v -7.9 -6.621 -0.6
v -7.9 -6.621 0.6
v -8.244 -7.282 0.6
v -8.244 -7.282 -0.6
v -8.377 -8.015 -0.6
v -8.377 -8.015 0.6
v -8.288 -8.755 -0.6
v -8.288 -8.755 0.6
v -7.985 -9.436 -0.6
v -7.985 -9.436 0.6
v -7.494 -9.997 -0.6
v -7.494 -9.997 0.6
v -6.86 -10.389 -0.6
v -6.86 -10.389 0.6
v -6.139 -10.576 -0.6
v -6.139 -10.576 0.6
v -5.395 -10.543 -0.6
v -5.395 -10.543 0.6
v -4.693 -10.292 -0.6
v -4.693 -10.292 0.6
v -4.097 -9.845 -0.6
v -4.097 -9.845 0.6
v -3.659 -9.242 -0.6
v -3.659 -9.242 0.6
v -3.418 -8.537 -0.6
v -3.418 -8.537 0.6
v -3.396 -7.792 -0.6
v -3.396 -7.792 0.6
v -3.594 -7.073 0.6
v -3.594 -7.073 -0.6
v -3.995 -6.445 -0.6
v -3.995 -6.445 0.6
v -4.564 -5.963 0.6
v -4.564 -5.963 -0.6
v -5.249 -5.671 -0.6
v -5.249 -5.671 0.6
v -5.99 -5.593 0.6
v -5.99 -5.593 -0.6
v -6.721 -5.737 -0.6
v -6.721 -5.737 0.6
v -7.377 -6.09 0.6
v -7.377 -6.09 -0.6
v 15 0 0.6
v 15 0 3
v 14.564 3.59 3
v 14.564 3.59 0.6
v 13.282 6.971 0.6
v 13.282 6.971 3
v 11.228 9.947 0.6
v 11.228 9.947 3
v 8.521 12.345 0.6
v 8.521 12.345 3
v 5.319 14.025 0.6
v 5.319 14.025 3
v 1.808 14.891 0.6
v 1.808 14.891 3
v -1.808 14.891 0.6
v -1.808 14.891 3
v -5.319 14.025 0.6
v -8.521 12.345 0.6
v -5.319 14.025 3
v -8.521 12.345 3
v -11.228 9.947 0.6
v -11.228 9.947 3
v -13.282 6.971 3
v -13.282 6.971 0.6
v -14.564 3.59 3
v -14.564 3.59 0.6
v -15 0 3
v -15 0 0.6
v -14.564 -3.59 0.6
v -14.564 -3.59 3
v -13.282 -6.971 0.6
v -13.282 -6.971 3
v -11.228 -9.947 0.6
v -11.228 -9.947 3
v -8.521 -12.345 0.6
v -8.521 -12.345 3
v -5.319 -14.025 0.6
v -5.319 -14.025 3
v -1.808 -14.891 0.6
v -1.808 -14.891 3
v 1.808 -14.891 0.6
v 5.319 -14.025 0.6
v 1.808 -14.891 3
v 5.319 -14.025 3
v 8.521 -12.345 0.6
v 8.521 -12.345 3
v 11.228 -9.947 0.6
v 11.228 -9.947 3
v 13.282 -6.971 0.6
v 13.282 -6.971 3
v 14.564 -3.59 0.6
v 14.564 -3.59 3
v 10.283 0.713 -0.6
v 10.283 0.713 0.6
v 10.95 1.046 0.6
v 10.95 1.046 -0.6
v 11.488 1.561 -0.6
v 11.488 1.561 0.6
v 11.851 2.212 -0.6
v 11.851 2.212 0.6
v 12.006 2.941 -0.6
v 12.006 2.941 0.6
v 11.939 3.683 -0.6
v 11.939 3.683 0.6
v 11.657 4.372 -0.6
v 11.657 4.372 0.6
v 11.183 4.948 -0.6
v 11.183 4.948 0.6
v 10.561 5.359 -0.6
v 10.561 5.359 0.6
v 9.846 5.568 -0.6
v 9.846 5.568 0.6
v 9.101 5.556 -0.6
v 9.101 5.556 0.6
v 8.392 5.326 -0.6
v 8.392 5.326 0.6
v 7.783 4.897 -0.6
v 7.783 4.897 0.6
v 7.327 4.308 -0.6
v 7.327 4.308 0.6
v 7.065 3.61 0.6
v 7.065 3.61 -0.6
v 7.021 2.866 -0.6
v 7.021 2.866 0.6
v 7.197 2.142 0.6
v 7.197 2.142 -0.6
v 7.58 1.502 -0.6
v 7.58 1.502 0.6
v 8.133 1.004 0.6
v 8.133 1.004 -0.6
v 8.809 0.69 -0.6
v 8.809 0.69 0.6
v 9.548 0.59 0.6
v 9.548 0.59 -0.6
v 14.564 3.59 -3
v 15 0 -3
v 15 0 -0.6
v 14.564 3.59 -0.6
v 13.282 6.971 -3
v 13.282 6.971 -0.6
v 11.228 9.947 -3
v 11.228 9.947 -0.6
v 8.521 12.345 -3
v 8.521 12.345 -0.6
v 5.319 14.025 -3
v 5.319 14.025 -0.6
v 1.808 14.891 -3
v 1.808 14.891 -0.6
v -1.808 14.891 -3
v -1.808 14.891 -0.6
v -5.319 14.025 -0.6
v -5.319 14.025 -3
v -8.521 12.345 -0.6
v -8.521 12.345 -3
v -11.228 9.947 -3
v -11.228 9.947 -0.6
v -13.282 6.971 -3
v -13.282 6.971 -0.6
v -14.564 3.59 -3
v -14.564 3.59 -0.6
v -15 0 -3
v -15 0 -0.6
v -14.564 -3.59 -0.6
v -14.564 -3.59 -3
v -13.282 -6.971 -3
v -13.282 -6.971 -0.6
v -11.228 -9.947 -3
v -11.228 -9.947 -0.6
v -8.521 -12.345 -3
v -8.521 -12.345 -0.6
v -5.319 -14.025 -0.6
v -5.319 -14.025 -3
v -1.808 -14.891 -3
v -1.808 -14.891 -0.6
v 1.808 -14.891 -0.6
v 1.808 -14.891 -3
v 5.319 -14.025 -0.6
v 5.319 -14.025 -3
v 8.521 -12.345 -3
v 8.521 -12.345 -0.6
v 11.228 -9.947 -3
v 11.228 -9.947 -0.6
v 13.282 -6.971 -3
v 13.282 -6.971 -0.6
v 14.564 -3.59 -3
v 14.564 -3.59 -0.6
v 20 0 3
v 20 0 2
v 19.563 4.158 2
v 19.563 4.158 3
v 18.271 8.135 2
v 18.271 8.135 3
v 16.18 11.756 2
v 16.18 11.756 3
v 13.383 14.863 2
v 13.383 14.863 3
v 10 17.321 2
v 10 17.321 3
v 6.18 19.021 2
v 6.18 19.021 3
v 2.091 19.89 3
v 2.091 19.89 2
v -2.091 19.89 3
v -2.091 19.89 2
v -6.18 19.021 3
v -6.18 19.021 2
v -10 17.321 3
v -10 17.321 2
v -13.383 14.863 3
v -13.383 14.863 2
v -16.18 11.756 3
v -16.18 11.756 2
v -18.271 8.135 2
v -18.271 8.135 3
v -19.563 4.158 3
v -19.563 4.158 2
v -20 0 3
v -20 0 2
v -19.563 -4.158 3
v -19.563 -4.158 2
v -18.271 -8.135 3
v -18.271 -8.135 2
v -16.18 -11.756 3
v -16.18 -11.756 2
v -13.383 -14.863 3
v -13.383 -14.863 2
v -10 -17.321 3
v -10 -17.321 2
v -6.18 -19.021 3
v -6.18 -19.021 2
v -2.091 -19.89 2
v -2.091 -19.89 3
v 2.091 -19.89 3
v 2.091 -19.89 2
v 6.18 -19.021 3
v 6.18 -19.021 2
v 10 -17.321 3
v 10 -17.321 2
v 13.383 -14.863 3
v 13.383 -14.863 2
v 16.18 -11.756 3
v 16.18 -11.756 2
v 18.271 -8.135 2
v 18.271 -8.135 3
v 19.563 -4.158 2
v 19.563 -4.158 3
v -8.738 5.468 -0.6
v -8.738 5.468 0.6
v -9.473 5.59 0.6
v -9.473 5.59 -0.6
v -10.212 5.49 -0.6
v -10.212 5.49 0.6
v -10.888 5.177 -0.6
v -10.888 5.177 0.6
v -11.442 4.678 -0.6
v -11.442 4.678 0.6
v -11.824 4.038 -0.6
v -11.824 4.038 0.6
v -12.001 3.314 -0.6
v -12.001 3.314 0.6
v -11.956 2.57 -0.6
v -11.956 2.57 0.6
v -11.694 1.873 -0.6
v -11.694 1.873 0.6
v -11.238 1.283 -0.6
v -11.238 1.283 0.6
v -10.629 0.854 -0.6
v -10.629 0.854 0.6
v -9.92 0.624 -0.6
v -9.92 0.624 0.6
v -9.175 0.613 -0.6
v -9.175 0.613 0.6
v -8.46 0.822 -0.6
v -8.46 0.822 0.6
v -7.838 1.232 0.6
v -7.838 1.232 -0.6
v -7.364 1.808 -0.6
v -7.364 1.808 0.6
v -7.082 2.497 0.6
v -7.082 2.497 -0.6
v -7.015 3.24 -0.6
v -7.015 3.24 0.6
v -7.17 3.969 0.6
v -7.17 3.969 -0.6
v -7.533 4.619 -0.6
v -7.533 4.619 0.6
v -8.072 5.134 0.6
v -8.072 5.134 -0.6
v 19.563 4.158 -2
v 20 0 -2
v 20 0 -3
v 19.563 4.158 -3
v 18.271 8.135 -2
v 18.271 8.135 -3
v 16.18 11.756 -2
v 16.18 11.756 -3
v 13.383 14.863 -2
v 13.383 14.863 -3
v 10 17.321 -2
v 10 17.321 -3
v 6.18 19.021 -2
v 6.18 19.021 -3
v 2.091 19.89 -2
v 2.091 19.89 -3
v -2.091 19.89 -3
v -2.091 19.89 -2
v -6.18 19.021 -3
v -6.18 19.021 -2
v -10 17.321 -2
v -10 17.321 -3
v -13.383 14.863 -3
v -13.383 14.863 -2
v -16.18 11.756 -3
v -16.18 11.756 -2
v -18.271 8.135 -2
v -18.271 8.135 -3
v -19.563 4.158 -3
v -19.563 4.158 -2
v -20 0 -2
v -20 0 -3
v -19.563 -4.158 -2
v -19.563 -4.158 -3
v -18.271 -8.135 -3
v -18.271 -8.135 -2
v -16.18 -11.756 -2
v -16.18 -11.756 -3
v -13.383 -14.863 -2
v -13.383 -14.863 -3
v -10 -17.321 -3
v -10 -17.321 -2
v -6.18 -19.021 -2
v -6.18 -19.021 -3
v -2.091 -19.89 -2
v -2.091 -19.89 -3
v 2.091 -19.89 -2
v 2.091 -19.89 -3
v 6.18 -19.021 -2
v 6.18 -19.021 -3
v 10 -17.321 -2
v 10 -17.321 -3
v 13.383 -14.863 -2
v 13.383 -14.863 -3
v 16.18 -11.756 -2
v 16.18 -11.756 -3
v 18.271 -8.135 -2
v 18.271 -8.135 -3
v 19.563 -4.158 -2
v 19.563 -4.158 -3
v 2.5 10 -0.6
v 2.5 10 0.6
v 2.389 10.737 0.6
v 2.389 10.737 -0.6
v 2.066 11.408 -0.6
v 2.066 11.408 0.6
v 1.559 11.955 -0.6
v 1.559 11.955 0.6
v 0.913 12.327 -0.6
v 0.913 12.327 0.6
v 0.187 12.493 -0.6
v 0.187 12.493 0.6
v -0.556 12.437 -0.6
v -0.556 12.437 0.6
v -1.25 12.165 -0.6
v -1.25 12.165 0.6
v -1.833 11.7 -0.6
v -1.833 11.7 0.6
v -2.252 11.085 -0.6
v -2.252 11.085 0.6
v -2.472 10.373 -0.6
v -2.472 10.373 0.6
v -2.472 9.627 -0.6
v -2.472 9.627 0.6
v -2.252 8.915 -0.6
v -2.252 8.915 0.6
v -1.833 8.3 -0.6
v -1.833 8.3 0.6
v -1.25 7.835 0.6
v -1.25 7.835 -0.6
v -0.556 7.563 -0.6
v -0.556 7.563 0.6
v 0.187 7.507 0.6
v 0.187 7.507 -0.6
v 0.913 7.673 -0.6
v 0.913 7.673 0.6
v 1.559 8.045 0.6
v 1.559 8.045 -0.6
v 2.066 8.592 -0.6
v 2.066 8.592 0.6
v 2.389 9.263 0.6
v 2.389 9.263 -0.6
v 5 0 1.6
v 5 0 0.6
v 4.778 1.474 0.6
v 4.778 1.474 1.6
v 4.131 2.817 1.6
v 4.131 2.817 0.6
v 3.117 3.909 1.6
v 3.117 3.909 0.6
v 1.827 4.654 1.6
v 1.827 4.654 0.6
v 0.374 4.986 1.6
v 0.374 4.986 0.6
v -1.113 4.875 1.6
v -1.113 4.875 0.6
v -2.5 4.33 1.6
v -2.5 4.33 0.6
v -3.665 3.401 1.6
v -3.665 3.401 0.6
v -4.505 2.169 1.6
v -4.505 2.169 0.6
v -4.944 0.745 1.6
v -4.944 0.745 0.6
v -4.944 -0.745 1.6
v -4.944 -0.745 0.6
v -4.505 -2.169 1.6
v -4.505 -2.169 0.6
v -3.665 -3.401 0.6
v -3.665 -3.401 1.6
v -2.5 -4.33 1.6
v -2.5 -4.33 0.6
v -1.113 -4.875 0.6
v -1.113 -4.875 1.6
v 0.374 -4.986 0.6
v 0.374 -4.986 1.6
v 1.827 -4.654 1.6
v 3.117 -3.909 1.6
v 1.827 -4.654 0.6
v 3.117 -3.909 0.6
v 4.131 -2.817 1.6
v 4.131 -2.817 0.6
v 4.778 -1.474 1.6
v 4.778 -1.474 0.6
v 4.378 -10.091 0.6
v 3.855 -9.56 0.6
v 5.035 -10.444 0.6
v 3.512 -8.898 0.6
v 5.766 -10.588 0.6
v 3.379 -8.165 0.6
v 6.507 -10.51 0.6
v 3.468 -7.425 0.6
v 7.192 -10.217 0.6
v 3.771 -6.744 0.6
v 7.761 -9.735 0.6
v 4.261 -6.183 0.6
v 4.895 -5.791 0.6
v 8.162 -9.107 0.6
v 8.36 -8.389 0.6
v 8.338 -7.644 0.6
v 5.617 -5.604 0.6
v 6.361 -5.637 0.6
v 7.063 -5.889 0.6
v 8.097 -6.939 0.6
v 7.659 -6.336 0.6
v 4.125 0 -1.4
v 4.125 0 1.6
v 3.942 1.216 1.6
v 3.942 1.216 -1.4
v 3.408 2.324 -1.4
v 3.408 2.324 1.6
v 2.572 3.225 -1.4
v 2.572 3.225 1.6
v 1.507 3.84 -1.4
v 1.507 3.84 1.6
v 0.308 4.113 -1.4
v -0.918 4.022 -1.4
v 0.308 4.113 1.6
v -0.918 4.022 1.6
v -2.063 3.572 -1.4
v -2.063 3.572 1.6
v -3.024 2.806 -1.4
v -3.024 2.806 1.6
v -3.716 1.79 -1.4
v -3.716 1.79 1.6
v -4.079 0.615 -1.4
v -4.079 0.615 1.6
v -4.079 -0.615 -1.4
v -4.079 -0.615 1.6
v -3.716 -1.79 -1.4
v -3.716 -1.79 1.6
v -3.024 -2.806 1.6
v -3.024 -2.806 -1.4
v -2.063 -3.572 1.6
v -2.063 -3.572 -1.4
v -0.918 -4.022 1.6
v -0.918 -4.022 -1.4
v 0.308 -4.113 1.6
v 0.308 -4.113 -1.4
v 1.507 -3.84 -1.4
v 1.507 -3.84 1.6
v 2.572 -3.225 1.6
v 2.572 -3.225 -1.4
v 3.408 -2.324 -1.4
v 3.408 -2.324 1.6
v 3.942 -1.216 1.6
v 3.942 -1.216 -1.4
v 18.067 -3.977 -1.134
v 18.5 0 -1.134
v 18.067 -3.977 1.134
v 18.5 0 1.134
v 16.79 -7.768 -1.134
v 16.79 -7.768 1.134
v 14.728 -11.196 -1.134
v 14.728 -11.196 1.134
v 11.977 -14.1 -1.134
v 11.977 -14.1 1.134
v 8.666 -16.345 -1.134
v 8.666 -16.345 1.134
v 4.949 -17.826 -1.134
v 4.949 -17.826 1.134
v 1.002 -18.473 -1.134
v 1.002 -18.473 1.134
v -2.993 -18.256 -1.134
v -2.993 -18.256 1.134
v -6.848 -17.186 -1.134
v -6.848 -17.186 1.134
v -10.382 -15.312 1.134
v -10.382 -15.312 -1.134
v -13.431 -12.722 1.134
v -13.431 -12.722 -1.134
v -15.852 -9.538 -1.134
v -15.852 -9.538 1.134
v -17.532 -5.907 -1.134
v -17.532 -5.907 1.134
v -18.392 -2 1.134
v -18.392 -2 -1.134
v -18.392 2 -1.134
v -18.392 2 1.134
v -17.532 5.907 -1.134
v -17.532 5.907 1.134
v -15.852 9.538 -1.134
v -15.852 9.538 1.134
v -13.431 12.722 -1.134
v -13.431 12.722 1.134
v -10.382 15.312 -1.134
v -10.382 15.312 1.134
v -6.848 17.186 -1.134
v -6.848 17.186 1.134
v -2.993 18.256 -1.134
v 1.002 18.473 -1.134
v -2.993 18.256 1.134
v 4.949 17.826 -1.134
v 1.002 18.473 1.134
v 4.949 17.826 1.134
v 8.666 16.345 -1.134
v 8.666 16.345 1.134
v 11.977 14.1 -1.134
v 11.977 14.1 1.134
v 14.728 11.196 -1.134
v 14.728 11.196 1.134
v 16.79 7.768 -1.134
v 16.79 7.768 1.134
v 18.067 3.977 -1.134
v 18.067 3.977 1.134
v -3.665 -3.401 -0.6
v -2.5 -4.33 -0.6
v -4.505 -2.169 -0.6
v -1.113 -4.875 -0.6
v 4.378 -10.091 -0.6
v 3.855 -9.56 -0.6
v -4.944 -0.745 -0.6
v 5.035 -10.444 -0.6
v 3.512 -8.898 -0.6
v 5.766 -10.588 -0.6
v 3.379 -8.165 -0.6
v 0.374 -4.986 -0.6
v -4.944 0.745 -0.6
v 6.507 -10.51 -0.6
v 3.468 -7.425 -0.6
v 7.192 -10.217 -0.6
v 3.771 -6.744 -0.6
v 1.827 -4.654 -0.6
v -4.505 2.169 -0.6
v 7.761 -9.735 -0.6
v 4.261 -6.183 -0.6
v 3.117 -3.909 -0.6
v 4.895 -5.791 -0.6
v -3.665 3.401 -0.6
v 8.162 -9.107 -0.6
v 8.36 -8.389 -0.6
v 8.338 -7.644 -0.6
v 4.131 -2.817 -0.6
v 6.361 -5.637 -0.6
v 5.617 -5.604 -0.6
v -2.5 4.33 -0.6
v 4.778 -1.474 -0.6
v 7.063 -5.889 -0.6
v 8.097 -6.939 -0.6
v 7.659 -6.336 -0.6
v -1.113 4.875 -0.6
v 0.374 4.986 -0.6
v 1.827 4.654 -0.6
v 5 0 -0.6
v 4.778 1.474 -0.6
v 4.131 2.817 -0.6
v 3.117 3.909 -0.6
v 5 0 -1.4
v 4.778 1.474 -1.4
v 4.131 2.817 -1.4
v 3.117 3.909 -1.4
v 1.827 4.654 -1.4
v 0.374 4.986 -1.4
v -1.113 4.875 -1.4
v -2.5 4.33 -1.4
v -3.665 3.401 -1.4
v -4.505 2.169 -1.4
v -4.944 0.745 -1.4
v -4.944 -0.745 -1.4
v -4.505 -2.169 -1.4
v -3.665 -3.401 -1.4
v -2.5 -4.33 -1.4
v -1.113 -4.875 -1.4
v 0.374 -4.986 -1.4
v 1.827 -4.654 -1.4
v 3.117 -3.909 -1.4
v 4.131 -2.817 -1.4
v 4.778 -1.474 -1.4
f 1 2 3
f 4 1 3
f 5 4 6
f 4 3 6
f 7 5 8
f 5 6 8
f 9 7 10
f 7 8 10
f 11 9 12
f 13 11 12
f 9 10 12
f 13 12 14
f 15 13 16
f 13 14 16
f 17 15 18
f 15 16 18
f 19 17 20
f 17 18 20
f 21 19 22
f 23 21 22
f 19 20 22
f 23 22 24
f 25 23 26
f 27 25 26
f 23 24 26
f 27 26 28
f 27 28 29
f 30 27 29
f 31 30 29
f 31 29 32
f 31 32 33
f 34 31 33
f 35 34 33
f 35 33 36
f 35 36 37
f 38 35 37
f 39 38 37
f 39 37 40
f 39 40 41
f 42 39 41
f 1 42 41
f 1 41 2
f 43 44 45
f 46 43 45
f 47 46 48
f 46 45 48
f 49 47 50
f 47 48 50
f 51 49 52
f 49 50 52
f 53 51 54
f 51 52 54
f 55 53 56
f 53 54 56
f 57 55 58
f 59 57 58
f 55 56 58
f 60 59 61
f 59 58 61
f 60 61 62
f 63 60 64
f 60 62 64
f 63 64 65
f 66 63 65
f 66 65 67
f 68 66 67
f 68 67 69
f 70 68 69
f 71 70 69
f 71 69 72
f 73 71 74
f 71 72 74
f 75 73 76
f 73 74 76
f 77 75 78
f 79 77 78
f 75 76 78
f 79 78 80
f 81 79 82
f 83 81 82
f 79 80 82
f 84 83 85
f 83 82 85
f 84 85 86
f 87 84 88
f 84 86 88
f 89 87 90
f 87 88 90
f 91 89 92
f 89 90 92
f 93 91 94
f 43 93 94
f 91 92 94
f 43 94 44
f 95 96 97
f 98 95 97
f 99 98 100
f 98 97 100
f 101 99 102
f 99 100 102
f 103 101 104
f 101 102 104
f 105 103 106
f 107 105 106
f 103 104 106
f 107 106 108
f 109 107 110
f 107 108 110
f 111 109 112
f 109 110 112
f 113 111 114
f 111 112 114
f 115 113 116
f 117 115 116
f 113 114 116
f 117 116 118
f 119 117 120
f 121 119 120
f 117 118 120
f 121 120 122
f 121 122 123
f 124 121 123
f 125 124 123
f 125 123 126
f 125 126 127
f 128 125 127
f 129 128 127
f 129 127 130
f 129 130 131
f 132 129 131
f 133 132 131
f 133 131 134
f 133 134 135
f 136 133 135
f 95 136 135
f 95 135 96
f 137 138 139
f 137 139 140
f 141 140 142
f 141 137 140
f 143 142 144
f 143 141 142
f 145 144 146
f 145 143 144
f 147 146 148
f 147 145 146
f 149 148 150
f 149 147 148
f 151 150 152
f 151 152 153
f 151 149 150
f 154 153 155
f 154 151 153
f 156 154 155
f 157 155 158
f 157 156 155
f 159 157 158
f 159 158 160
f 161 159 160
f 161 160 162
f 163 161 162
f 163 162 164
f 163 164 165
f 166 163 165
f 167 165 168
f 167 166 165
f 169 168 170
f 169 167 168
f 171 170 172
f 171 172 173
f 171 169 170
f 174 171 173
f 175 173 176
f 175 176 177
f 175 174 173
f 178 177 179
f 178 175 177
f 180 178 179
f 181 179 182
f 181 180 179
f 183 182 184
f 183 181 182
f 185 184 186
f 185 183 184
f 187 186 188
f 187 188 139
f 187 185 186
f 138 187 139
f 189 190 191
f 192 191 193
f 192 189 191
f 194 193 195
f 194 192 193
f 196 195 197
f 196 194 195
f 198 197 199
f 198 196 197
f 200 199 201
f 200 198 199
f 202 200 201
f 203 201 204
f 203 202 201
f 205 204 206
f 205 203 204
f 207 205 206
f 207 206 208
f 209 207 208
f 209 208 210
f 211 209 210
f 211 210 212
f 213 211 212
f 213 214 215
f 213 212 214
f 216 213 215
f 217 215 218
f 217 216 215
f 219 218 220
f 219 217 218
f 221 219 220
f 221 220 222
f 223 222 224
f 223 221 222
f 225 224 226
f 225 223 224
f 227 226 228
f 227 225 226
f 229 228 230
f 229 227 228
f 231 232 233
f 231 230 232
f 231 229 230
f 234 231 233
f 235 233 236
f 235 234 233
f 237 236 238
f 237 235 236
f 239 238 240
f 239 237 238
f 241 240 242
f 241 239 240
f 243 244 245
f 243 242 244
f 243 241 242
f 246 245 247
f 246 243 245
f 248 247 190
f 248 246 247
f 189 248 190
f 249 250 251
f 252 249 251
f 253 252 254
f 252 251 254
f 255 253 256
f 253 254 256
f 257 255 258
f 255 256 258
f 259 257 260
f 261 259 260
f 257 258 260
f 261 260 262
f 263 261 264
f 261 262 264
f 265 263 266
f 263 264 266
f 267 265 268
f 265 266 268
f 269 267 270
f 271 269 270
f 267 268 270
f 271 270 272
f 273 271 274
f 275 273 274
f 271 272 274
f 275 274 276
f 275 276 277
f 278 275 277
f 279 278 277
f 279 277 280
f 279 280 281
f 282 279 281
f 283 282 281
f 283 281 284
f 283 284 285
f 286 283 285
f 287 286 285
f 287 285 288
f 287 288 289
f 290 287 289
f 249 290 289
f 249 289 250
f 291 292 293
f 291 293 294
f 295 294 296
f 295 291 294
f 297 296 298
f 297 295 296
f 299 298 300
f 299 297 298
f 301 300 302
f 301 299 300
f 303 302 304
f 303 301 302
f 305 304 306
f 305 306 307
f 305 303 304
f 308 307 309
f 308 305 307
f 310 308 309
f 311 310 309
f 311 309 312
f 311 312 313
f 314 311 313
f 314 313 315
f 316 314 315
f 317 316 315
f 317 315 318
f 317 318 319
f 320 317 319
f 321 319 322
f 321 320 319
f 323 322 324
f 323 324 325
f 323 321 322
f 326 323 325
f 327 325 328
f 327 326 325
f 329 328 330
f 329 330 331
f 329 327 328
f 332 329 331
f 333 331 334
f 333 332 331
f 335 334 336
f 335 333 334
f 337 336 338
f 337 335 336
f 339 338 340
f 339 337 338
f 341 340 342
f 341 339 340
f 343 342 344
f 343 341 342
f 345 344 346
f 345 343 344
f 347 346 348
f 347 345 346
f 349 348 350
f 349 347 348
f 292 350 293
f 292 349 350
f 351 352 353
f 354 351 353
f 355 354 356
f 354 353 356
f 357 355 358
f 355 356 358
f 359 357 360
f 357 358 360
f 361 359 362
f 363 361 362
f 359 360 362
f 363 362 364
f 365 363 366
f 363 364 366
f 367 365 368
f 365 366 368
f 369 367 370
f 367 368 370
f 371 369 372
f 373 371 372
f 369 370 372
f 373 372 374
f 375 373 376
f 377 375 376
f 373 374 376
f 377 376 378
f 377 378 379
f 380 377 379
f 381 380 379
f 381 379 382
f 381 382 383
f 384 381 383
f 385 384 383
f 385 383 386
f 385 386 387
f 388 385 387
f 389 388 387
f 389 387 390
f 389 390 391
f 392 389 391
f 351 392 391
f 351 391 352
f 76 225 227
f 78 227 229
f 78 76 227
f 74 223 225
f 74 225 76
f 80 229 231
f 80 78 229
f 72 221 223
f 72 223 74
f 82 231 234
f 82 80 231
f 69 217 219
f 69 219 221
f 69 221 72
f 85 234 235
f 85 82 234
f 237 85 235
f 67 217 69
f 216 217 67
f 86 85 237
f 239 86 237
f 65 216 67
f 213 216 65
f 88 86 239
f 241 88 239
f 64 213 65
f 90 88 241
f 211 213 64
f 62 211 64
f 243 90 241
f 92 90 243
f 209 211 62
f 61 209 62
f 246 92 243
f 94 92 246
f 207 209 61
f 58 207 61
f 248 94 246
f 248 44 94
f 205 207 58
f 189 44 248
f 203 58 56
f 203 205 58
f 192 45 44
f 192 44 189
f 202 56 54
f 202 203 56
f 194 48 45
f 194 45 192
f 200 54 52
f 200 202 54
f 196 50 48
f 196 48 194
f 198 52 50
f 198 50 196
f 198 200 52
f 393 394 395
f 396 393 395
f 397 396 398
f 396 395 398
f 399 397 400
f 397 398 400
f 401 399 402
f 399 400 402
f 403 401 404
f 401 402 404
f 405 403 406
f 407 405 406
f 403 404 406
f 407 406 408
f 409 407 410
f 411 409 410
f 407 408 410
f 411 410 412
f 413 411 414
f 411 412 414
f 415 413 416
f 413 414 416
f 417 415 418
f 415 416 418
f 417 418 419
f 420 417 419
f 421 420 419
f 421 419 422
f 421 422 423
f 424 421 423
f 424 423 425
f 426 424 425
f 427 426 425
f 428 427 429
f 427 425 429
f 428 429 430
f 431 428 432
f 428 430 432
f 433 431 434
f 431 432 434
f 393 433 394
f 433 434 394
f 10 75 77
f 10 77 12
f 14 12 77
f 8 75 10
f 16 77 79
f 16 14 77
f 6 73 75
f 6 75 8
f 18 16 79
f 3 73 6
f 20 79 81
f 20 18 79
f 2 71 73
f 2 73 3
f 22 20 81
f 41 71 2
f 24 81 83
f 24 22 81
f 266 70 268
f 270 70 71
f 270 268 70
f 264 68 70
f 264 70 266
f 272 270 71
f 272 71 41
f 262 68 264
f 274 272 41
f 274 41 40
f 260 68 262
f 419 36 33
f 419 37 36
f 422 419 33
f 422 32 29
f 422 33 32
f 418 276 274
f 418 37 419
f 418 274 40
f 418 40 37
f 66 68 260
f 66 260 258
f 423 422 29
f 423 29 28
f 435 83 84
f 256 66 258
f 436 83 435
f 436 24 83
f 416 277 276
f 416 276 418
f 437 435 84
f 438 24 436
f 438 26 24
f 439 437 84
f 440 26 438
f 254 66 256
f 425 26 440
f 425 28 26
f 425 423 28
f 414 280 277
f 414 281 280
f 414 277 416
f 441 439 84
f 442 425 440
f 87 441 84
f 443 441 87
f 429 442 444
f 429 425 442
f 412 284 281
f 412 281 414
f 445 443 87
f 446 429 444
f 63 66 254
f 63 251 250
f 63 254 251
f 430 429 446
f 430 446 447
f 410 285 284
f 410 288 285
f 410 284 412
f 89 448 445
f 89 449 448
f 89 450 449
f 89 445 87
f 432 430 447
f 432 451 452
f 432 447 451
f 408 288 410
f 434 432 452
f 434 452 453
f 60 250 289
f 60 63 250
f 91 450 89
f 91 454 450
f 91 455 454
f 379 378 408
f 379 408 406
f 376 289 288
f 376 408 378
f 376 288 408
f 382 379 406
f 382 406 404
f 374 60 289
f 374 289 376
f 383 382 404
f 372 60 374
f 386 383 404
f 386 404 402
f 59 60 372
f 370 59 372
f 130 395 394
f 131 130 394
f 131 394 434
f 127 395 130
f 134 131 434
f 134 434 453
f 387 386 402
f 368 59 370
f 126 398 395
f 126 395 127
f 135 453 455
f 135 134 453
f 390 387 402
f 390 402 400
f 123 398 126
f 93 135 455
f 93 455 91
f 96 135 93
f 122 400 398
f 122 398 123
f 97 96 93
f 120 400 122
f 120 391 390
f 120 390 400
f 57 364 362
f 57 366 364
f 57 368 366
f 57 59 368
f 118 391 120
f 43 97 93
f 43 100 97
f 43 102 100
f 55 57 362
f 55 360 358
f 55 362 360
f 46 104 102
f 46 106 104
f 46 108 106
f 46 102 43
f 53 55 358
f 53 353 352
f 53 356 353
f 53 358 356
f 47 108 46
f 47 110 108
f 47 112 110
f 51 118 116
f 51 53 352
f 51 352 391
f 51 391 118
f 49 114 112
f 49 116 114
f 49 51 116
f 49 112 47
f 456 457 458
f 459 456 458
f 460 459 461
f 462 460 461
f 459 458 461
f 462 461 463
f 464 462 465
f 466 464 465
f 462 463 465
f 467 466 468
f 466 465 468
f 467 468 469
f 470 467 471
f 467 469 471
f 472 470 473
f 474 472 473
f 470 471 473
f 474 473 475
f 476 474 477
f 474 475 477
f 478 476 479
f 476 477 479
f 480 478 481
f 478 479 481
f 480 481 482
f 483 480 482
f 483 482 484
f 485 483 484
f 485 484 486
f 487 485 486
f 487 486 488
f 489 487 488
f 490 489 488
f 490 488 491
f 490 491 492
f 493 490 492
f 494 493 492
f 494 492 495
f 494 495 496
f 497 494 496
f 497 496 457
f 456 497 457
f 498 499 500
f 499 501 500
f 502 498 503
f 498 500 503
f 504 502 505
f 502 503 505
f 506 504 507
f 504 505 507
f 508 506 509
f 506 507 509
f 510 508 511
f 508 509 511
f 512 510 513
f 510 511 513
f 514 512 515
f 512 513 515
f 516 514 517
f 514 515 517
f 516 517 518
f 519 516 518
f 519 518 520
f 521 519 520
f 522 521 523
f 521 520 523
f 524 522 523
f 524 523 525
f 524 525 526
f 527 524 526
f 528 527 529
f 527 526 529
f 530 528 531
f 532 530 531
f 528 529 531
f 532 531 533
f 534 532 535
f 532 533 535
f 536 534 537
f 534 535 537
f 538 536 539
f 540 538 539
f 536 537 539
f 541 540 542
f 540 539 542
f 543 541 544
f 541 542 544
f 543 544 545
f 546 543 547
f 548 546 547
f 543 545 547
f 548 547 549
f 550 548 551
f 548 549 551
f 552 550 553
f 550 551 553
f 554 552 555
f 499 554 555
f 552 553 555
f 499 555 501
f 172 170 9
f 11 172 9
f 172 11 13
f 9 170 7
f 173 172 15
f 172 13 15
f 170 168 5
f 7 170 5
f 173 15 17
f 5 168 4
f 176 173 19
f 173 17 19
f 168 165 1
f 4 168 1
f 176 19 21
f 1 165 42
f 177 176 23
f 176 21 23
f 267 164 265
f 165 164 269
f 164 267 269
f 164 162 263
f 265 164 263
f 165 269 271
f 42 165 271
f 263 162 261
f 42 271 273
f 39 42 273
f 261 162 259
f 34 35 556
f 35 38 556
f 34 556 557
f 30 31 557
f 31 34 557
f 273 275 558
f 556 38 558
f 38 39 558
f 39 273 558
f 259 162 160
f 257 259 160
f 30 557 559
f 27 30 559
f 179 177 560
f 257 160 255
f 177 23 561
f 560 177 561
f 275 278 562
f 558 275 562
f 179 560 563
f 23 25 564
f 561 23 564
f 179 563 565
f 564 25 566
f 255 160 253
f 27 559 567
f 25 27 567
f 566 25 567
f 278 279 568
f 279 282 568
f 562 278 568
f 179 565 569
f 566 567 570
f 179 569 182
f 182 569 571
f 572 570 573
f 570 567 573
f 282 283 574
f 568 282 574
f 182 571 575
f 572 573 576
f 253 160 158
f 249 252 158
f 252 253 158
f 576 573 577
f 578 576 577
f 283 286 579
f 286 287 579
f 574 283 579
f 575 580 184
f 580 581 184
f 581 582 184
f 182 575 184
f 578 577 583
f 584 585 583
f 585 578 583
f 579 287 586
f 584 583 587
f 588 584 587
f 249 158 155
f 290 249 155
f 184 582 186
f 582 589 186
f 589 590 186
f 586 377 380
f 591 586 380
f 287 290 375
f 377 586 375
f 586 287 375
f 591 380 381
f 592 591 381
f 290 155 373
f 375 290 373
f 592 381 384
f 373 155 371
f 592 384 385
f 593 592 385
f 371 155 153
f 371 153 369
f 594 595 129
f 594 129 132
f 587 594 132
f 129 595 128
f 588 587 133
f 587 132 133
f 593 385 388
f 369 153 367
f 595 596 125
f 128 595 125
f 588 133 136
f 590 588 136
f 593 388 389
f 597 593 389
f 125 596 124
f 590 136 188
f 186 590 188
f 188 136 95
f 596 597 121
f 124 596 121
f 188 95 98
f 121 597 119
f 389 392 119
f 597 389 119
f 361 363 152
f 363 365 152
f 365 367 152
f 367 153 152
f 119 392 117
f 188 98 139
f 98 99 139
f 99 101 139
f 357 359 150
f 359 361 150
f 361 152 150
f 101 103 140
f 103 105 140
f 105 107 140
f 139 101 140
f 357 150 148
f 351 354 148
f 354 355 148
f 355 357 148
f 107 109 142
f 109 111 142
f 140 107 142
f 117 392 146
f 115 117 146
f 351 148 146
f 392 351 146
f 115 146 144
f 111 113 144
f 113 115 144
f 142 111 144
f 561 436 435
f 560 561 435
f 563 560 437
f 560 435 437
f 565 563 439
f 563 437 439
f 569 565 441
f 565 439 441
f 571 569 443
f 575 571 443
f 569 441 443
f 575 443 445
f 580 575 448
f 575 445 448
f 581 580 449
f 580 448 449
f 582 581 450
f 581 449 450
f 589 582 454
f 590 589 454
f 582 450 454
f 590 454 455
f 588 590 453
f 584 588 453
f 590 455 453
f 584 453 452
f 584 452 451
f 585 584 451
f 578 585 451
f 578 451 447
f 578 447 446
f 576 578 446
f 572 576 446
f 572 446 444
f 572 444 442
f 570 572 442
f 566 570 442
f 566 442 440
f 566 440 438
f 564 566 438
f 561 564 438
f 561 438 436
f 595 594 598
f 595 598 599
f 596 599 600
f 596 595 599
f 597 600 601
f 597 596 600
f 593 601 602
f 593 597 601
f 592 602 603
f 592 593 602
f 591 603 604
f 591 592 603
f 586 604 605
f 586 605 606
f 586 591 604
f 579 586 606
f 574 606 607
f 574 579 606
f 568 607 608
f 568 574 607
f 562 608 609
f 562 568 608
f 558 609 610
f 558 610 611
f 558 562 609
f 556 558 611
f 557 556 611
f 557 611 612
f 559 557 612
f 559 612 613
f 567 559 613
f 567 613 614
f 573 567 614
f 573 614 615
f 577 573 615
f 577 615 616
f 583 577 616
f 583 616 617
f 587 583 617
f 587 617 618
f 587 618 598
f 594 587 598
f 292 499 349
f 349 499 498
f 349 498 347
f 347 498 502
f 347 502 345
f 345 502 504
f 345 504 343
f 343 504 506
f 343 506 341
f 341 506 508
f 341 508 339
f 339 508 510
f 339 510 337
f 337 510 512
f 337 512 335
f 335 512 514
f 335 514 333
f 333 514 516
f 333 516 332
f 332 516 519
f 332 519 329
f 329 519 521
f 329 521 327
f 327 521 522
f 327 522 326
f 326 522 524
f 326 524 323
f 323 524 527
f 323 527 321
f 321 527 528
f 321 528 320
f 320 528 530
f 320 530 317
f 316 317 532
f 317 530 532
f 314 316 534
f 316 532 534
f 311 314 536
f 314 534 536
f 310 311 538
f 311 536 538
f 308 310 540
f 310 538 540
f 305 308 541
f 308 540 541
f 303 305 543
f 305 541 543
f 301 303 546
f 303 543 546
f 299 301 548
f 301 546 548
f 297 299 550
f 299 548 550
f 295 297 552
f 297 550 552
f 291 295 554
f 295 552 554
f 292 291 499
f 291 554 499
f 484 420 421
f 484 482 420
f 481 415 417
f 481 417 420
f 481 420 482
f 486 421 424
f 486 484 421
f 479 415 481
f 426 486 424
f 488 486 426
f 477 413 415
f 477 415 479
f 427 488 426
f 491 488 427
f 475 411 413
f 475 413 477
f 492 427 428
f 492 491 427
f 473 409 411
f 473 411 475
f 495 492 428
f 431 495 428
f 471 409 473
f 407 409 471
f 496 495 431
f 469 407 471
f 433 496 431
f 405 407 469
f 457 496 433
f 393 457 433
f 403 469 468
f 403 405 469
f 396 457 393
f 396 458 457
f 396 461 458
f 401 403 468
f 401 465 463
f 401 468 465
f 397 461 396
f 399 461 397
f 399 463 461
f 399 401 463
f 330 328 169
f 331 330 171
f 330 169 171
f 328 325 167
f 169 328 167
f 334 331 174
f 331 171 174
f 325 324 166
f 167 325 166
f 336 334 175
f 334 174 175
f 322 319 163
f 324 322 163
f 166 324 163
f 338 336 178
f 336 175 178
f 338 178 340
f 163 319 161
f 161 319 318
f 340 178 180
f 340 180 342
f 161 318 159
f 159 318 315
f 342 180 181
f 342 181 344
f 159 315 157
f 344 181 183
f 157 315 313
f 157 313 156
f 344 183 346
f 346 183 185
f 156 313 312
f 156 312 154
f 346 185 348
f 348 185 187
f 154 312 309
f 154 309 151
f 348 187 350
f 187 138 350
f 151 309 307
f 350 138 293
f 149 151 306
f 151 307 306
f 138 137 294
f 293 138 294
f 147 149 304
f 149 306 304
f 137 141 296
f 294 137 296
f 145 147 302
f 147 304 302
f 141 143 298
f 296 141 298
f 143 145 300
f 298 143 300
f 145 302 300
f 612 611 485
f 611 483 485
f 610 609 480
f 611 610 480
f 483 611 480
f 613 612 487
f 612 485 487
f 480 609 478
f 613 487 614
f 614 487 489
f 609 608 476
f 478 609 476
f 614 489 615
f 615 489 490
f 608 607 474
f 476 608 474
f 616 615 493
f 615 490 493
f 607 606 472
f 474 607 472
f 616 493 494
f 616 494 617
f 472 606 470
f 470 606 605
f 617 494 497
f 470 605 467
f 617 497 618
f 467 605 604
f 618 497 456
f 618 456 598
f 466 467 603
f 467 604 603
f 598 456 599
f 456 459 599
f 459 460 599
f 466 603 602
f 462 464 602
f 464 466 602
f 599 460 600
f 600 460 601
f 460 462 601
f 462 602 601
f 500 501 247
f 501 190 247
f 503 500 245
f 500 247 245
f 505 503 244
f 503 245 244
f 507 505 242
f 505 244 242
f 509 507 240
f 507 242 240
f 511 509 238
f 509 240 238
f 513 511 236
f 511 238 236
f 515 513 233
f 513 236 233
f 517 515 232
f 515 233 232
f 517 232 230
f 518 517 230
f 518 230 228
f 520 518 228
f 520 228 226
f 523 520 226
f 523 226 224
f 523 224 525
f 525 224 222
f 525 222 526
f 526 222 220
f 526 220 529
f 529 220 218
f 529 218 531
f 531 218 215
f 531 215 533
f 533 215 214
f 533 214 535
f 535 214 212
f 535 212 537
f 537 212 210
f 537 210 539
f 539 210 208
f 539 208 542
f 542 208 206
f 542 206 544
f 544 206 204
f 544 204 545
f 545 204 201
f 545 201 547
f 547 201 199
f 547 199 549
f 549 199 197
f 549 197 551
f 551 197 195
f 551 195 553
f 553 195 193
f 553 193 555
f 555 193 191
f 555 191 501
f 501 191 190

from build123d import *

# Parameters (mm, degrees)
SKETCH1_R                = 20
SKETCH1_R_2              = 4
BOSS_EXTRUDE1_DEPTH      = 3
SKETCH3_R                = 15
CUT_EXTRUDE1_DEPTH       = 2.4
SKETCH4_R                = 2.5
CUT_EXTRUDE2_DEPTH       = 4.6
CIRPATTERN1_COUNT        = 5
SKETCH14_R               = 5
BOSS_EXTRUDE3_DEPTH      = 1
BOSS_EXTRUDE3_DEPTH_BACK = 2
SKETCH16_R               = 4.125
CUT_EXTRUDE3_DEPTH       = 5.6


with BuildPart() as part:
    # Sketch1 → Boss-Extrude1 (new body, symmetric)
    with BuildSketch(Plane.XY):
        Circle(SKETCH1_R)
        Circle(SKETCH1_R_2, mode=Mode.SUBTRACT)
    extrude(amount=BOSS_EXTRUDE1_DEPTH, both=True)

    # Sketch3 → Cut-Extrude1 (cut)
    with BuildSketch(Plane.XY.offset(3)):
        Circle(SKETCH3_R)
    cut_extrude1 = extrude(amount=-CUT_EXTRUDE1_DEPTH, mode=Mode.SUBTRACT)

    # Mirror1: Cut-Extrude1 across plane
    add(cut_extrude1.mirror(Plane.XY), mode=Mode.SUBTRACT)

    # Sketch4 → Cut-Extrude2 (cut, through all)
    with BuildSketch(Plane.XY.offset(0.6)):
        with Locations((0, 10)):
            Circle(SKETCH4_R)
    cut_extrude2 = extrude(amount=-CUT_EXTRUDE2_DEPTH, mode=Mode.SUBTRACT)

    # CirPattern1: Cut-Extrude2 ×5 about axis
    cirpattern1_axis = Axis((0, 0, 0), (0, 0, 1))
    for i in range(1, CIRPATTERN1_COUNT):
        add(cut_extrude2.rotate(cirpattern1_axis, i * 360 / CIRPATTERN1_COUNT), mode=Mode.SUBTRACT)

    # Sketch5 → Cut-Revolve1 (revolve, cut)
    with BuildSketch(Plane(origin=(0, 0, 0), x_dir=(1, 0, 0), z_dir=(0, 1, 0))):
        Polygon((20, 2), (18.5, 1.133974596), (18.5, -1.133974596), (20, -2), align=None)
    revolve(axis=Axis((0, 0, 0), (0, 0, -1)), mode=Mode.SUBTRACT)

    # Sketch14 → Boss-Extrude3 (add, two sides)
    with BuildSketch(Plane.XY.offset(0.6)) as boss_extrude3_sk:
        Circle(SKETCH14_R)
    extrude(amount=BOSS_EXTRUDE3_DEPTH)
    extrude(boss_extrude3_sk.sketch, amount=-BOSS_EXTRUDE3_DEPTH_BACK)

    # Sketch16 → Cut-Extrude3 (cut, through all)
    with BuildSketch(Plane.XY.offset(1.6)):
        Circle(SKETCH16_R)
    extrude(amount=-CUT_EXTRUDE3_DEPTH, mode=Mode.SUBTRACT)


solid = part.part
